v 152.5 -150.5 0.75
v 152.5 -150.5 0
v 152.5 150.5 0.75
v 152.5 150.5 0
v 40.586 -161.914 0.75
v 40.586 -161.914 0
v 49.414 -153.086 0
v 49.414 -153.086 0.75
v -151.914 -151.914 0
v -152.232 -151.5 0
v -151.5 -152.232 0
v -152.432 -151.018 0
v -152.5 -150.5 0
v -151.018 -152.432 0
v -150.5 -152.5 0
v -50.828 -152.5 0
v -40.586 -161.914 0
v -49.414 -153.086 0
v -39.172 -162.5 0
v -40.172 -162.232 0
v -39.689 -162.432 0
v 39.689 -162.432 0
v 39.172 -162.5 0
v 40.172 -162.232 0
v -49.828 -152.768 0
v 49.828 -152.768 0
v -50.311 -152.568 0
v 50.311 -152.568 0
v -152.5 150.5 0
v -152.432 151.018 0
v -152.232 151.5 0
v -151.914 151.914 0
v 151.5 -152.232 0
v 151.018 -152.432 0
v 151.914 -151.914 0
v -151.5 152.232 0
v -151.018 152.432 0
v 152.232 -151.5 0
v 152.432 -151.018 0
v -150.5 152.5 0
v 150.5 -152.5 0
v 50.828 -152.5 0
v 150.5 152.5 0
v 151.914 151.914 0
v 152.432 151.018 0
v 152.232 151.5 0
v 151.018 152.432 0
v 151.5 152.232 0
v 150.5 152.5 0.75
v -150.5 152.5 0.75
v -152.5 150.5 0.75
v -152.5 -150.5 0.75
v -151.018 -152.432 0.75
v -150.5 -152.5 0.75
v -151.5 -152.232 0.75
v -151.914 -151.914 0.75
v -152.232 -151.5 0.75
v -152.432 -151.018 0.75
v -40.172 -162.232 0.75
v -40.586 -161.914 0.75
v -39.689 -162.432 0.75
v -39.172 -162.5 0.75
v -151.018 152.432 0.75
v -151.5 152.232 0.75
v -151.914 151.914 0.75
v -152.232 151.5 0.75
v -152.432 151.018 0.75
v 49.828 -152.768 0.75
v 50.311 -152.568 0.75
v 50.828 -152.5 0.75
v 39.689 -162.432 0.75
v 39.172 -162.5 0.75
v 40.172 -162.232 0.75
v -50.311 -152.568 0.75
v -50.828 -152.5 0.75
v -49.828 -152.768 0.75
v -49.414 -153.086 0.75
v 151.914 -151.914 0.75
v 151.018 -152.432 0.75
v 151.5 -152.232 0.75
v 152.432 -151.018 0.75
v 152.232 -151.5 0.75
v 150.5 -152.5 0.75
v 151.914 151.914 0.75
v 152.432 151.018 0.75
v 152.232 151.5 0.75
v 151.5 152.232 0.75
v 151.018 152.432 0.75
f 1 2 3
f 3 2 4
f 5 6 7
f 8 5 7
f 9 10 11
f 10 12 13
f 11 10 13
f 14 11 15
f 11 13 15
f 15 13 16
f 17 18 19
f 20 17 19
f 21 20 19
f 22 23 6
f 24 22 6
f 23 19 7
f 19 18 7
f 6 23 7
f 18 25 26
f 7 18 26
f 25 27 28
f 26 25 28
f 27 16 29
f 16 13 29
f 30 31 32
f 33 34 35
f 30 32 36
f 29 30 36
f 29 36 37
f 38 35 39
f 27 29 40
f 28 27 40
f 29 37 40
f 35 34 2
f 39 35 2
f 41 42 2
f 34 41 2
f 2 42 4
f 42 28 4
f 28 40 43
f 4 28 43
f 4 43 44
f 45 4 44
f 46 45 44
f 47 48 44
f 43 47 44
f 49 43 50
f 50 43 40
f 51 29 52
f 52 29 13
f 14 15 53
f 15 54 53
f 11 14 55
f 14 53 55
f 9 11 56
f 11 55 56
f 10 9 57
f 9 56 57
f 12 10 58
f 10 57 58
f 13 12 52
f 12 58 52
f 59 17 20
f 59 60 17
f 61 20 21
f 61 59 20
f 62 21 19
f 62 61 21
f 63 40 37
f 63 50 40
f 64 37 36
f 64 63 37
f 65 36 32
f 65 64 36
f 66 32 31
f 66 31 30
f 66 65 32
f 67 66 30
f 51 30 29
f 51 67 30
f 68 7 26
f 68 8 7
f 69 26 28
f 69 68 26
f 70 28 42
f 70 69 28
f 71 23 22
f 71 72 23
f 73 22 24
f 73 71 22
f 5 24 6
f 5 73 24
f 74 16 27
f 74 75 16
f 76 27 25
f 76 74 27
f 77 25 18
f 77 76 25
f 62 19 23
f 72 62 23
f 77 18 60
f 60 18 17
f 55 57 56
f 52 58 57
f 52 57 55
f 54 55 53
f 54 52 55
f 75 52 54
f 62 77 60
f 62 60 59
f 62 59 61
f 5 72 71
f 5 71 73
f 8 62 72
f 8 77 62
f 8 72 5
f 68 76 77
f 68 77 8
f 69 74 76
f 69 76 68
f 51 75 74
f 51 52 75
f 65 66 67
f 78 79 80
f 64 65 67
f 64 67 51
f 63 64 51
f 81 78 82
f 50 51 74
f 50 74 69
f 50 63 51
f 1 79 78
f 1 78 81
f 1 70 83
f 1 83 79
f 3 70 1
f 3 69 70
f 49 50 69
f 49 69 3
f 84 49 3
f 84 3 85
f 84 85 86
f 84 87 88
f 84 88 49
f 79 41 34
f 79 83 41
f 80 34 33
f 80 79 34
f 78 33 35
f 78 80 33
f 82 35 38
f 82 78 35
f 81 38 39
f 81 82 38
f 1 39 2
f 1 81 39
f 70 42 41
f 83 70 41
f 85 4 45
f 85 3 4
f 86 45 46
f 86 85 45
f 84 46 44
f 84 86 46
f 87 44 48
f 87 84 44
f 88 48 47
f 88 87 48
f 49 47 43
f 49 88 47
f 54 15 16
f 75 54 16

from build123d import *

# Parameters (mm, degrees)
BOSS_EXTRUDE1_DEPTH = 0.75
FILLET1_R           = 2


with BuildPart() as part:
    # Sketch1 → Boss-Extrude1 (new body)
    with BuildSketch(Plane.XY):
        Polygon((-152.5, -152.5), (-50, -152.5), (-40, -162.5), (40, -162.5), (50, -152.5), (152.5, -152.5), (152.5, 152.5), (-152.5, 152.5), align=None)
    extrude(amount=BOSS_EXTRUDE1_DEPTH)

    # Fillet1
    fillet1_edges = [part.edges().sort_by_distance(p)[0] for p in [
        (152.5, -152.5, 0.375),
        (50, -152.5, 0.375),
        (40, -162.5, 0.375),
        (-40, -162.5, 0.375),
        (-50, -152.5, 0.375),
        (-152.5, -152.5, 0.375),
        (-152.5, 152.5, 0.375),
        (152.5, 152.5, 0.375),
    ]]
    fillet(fillet1_edges, radius=FILLET1_R)


solid = part.part
